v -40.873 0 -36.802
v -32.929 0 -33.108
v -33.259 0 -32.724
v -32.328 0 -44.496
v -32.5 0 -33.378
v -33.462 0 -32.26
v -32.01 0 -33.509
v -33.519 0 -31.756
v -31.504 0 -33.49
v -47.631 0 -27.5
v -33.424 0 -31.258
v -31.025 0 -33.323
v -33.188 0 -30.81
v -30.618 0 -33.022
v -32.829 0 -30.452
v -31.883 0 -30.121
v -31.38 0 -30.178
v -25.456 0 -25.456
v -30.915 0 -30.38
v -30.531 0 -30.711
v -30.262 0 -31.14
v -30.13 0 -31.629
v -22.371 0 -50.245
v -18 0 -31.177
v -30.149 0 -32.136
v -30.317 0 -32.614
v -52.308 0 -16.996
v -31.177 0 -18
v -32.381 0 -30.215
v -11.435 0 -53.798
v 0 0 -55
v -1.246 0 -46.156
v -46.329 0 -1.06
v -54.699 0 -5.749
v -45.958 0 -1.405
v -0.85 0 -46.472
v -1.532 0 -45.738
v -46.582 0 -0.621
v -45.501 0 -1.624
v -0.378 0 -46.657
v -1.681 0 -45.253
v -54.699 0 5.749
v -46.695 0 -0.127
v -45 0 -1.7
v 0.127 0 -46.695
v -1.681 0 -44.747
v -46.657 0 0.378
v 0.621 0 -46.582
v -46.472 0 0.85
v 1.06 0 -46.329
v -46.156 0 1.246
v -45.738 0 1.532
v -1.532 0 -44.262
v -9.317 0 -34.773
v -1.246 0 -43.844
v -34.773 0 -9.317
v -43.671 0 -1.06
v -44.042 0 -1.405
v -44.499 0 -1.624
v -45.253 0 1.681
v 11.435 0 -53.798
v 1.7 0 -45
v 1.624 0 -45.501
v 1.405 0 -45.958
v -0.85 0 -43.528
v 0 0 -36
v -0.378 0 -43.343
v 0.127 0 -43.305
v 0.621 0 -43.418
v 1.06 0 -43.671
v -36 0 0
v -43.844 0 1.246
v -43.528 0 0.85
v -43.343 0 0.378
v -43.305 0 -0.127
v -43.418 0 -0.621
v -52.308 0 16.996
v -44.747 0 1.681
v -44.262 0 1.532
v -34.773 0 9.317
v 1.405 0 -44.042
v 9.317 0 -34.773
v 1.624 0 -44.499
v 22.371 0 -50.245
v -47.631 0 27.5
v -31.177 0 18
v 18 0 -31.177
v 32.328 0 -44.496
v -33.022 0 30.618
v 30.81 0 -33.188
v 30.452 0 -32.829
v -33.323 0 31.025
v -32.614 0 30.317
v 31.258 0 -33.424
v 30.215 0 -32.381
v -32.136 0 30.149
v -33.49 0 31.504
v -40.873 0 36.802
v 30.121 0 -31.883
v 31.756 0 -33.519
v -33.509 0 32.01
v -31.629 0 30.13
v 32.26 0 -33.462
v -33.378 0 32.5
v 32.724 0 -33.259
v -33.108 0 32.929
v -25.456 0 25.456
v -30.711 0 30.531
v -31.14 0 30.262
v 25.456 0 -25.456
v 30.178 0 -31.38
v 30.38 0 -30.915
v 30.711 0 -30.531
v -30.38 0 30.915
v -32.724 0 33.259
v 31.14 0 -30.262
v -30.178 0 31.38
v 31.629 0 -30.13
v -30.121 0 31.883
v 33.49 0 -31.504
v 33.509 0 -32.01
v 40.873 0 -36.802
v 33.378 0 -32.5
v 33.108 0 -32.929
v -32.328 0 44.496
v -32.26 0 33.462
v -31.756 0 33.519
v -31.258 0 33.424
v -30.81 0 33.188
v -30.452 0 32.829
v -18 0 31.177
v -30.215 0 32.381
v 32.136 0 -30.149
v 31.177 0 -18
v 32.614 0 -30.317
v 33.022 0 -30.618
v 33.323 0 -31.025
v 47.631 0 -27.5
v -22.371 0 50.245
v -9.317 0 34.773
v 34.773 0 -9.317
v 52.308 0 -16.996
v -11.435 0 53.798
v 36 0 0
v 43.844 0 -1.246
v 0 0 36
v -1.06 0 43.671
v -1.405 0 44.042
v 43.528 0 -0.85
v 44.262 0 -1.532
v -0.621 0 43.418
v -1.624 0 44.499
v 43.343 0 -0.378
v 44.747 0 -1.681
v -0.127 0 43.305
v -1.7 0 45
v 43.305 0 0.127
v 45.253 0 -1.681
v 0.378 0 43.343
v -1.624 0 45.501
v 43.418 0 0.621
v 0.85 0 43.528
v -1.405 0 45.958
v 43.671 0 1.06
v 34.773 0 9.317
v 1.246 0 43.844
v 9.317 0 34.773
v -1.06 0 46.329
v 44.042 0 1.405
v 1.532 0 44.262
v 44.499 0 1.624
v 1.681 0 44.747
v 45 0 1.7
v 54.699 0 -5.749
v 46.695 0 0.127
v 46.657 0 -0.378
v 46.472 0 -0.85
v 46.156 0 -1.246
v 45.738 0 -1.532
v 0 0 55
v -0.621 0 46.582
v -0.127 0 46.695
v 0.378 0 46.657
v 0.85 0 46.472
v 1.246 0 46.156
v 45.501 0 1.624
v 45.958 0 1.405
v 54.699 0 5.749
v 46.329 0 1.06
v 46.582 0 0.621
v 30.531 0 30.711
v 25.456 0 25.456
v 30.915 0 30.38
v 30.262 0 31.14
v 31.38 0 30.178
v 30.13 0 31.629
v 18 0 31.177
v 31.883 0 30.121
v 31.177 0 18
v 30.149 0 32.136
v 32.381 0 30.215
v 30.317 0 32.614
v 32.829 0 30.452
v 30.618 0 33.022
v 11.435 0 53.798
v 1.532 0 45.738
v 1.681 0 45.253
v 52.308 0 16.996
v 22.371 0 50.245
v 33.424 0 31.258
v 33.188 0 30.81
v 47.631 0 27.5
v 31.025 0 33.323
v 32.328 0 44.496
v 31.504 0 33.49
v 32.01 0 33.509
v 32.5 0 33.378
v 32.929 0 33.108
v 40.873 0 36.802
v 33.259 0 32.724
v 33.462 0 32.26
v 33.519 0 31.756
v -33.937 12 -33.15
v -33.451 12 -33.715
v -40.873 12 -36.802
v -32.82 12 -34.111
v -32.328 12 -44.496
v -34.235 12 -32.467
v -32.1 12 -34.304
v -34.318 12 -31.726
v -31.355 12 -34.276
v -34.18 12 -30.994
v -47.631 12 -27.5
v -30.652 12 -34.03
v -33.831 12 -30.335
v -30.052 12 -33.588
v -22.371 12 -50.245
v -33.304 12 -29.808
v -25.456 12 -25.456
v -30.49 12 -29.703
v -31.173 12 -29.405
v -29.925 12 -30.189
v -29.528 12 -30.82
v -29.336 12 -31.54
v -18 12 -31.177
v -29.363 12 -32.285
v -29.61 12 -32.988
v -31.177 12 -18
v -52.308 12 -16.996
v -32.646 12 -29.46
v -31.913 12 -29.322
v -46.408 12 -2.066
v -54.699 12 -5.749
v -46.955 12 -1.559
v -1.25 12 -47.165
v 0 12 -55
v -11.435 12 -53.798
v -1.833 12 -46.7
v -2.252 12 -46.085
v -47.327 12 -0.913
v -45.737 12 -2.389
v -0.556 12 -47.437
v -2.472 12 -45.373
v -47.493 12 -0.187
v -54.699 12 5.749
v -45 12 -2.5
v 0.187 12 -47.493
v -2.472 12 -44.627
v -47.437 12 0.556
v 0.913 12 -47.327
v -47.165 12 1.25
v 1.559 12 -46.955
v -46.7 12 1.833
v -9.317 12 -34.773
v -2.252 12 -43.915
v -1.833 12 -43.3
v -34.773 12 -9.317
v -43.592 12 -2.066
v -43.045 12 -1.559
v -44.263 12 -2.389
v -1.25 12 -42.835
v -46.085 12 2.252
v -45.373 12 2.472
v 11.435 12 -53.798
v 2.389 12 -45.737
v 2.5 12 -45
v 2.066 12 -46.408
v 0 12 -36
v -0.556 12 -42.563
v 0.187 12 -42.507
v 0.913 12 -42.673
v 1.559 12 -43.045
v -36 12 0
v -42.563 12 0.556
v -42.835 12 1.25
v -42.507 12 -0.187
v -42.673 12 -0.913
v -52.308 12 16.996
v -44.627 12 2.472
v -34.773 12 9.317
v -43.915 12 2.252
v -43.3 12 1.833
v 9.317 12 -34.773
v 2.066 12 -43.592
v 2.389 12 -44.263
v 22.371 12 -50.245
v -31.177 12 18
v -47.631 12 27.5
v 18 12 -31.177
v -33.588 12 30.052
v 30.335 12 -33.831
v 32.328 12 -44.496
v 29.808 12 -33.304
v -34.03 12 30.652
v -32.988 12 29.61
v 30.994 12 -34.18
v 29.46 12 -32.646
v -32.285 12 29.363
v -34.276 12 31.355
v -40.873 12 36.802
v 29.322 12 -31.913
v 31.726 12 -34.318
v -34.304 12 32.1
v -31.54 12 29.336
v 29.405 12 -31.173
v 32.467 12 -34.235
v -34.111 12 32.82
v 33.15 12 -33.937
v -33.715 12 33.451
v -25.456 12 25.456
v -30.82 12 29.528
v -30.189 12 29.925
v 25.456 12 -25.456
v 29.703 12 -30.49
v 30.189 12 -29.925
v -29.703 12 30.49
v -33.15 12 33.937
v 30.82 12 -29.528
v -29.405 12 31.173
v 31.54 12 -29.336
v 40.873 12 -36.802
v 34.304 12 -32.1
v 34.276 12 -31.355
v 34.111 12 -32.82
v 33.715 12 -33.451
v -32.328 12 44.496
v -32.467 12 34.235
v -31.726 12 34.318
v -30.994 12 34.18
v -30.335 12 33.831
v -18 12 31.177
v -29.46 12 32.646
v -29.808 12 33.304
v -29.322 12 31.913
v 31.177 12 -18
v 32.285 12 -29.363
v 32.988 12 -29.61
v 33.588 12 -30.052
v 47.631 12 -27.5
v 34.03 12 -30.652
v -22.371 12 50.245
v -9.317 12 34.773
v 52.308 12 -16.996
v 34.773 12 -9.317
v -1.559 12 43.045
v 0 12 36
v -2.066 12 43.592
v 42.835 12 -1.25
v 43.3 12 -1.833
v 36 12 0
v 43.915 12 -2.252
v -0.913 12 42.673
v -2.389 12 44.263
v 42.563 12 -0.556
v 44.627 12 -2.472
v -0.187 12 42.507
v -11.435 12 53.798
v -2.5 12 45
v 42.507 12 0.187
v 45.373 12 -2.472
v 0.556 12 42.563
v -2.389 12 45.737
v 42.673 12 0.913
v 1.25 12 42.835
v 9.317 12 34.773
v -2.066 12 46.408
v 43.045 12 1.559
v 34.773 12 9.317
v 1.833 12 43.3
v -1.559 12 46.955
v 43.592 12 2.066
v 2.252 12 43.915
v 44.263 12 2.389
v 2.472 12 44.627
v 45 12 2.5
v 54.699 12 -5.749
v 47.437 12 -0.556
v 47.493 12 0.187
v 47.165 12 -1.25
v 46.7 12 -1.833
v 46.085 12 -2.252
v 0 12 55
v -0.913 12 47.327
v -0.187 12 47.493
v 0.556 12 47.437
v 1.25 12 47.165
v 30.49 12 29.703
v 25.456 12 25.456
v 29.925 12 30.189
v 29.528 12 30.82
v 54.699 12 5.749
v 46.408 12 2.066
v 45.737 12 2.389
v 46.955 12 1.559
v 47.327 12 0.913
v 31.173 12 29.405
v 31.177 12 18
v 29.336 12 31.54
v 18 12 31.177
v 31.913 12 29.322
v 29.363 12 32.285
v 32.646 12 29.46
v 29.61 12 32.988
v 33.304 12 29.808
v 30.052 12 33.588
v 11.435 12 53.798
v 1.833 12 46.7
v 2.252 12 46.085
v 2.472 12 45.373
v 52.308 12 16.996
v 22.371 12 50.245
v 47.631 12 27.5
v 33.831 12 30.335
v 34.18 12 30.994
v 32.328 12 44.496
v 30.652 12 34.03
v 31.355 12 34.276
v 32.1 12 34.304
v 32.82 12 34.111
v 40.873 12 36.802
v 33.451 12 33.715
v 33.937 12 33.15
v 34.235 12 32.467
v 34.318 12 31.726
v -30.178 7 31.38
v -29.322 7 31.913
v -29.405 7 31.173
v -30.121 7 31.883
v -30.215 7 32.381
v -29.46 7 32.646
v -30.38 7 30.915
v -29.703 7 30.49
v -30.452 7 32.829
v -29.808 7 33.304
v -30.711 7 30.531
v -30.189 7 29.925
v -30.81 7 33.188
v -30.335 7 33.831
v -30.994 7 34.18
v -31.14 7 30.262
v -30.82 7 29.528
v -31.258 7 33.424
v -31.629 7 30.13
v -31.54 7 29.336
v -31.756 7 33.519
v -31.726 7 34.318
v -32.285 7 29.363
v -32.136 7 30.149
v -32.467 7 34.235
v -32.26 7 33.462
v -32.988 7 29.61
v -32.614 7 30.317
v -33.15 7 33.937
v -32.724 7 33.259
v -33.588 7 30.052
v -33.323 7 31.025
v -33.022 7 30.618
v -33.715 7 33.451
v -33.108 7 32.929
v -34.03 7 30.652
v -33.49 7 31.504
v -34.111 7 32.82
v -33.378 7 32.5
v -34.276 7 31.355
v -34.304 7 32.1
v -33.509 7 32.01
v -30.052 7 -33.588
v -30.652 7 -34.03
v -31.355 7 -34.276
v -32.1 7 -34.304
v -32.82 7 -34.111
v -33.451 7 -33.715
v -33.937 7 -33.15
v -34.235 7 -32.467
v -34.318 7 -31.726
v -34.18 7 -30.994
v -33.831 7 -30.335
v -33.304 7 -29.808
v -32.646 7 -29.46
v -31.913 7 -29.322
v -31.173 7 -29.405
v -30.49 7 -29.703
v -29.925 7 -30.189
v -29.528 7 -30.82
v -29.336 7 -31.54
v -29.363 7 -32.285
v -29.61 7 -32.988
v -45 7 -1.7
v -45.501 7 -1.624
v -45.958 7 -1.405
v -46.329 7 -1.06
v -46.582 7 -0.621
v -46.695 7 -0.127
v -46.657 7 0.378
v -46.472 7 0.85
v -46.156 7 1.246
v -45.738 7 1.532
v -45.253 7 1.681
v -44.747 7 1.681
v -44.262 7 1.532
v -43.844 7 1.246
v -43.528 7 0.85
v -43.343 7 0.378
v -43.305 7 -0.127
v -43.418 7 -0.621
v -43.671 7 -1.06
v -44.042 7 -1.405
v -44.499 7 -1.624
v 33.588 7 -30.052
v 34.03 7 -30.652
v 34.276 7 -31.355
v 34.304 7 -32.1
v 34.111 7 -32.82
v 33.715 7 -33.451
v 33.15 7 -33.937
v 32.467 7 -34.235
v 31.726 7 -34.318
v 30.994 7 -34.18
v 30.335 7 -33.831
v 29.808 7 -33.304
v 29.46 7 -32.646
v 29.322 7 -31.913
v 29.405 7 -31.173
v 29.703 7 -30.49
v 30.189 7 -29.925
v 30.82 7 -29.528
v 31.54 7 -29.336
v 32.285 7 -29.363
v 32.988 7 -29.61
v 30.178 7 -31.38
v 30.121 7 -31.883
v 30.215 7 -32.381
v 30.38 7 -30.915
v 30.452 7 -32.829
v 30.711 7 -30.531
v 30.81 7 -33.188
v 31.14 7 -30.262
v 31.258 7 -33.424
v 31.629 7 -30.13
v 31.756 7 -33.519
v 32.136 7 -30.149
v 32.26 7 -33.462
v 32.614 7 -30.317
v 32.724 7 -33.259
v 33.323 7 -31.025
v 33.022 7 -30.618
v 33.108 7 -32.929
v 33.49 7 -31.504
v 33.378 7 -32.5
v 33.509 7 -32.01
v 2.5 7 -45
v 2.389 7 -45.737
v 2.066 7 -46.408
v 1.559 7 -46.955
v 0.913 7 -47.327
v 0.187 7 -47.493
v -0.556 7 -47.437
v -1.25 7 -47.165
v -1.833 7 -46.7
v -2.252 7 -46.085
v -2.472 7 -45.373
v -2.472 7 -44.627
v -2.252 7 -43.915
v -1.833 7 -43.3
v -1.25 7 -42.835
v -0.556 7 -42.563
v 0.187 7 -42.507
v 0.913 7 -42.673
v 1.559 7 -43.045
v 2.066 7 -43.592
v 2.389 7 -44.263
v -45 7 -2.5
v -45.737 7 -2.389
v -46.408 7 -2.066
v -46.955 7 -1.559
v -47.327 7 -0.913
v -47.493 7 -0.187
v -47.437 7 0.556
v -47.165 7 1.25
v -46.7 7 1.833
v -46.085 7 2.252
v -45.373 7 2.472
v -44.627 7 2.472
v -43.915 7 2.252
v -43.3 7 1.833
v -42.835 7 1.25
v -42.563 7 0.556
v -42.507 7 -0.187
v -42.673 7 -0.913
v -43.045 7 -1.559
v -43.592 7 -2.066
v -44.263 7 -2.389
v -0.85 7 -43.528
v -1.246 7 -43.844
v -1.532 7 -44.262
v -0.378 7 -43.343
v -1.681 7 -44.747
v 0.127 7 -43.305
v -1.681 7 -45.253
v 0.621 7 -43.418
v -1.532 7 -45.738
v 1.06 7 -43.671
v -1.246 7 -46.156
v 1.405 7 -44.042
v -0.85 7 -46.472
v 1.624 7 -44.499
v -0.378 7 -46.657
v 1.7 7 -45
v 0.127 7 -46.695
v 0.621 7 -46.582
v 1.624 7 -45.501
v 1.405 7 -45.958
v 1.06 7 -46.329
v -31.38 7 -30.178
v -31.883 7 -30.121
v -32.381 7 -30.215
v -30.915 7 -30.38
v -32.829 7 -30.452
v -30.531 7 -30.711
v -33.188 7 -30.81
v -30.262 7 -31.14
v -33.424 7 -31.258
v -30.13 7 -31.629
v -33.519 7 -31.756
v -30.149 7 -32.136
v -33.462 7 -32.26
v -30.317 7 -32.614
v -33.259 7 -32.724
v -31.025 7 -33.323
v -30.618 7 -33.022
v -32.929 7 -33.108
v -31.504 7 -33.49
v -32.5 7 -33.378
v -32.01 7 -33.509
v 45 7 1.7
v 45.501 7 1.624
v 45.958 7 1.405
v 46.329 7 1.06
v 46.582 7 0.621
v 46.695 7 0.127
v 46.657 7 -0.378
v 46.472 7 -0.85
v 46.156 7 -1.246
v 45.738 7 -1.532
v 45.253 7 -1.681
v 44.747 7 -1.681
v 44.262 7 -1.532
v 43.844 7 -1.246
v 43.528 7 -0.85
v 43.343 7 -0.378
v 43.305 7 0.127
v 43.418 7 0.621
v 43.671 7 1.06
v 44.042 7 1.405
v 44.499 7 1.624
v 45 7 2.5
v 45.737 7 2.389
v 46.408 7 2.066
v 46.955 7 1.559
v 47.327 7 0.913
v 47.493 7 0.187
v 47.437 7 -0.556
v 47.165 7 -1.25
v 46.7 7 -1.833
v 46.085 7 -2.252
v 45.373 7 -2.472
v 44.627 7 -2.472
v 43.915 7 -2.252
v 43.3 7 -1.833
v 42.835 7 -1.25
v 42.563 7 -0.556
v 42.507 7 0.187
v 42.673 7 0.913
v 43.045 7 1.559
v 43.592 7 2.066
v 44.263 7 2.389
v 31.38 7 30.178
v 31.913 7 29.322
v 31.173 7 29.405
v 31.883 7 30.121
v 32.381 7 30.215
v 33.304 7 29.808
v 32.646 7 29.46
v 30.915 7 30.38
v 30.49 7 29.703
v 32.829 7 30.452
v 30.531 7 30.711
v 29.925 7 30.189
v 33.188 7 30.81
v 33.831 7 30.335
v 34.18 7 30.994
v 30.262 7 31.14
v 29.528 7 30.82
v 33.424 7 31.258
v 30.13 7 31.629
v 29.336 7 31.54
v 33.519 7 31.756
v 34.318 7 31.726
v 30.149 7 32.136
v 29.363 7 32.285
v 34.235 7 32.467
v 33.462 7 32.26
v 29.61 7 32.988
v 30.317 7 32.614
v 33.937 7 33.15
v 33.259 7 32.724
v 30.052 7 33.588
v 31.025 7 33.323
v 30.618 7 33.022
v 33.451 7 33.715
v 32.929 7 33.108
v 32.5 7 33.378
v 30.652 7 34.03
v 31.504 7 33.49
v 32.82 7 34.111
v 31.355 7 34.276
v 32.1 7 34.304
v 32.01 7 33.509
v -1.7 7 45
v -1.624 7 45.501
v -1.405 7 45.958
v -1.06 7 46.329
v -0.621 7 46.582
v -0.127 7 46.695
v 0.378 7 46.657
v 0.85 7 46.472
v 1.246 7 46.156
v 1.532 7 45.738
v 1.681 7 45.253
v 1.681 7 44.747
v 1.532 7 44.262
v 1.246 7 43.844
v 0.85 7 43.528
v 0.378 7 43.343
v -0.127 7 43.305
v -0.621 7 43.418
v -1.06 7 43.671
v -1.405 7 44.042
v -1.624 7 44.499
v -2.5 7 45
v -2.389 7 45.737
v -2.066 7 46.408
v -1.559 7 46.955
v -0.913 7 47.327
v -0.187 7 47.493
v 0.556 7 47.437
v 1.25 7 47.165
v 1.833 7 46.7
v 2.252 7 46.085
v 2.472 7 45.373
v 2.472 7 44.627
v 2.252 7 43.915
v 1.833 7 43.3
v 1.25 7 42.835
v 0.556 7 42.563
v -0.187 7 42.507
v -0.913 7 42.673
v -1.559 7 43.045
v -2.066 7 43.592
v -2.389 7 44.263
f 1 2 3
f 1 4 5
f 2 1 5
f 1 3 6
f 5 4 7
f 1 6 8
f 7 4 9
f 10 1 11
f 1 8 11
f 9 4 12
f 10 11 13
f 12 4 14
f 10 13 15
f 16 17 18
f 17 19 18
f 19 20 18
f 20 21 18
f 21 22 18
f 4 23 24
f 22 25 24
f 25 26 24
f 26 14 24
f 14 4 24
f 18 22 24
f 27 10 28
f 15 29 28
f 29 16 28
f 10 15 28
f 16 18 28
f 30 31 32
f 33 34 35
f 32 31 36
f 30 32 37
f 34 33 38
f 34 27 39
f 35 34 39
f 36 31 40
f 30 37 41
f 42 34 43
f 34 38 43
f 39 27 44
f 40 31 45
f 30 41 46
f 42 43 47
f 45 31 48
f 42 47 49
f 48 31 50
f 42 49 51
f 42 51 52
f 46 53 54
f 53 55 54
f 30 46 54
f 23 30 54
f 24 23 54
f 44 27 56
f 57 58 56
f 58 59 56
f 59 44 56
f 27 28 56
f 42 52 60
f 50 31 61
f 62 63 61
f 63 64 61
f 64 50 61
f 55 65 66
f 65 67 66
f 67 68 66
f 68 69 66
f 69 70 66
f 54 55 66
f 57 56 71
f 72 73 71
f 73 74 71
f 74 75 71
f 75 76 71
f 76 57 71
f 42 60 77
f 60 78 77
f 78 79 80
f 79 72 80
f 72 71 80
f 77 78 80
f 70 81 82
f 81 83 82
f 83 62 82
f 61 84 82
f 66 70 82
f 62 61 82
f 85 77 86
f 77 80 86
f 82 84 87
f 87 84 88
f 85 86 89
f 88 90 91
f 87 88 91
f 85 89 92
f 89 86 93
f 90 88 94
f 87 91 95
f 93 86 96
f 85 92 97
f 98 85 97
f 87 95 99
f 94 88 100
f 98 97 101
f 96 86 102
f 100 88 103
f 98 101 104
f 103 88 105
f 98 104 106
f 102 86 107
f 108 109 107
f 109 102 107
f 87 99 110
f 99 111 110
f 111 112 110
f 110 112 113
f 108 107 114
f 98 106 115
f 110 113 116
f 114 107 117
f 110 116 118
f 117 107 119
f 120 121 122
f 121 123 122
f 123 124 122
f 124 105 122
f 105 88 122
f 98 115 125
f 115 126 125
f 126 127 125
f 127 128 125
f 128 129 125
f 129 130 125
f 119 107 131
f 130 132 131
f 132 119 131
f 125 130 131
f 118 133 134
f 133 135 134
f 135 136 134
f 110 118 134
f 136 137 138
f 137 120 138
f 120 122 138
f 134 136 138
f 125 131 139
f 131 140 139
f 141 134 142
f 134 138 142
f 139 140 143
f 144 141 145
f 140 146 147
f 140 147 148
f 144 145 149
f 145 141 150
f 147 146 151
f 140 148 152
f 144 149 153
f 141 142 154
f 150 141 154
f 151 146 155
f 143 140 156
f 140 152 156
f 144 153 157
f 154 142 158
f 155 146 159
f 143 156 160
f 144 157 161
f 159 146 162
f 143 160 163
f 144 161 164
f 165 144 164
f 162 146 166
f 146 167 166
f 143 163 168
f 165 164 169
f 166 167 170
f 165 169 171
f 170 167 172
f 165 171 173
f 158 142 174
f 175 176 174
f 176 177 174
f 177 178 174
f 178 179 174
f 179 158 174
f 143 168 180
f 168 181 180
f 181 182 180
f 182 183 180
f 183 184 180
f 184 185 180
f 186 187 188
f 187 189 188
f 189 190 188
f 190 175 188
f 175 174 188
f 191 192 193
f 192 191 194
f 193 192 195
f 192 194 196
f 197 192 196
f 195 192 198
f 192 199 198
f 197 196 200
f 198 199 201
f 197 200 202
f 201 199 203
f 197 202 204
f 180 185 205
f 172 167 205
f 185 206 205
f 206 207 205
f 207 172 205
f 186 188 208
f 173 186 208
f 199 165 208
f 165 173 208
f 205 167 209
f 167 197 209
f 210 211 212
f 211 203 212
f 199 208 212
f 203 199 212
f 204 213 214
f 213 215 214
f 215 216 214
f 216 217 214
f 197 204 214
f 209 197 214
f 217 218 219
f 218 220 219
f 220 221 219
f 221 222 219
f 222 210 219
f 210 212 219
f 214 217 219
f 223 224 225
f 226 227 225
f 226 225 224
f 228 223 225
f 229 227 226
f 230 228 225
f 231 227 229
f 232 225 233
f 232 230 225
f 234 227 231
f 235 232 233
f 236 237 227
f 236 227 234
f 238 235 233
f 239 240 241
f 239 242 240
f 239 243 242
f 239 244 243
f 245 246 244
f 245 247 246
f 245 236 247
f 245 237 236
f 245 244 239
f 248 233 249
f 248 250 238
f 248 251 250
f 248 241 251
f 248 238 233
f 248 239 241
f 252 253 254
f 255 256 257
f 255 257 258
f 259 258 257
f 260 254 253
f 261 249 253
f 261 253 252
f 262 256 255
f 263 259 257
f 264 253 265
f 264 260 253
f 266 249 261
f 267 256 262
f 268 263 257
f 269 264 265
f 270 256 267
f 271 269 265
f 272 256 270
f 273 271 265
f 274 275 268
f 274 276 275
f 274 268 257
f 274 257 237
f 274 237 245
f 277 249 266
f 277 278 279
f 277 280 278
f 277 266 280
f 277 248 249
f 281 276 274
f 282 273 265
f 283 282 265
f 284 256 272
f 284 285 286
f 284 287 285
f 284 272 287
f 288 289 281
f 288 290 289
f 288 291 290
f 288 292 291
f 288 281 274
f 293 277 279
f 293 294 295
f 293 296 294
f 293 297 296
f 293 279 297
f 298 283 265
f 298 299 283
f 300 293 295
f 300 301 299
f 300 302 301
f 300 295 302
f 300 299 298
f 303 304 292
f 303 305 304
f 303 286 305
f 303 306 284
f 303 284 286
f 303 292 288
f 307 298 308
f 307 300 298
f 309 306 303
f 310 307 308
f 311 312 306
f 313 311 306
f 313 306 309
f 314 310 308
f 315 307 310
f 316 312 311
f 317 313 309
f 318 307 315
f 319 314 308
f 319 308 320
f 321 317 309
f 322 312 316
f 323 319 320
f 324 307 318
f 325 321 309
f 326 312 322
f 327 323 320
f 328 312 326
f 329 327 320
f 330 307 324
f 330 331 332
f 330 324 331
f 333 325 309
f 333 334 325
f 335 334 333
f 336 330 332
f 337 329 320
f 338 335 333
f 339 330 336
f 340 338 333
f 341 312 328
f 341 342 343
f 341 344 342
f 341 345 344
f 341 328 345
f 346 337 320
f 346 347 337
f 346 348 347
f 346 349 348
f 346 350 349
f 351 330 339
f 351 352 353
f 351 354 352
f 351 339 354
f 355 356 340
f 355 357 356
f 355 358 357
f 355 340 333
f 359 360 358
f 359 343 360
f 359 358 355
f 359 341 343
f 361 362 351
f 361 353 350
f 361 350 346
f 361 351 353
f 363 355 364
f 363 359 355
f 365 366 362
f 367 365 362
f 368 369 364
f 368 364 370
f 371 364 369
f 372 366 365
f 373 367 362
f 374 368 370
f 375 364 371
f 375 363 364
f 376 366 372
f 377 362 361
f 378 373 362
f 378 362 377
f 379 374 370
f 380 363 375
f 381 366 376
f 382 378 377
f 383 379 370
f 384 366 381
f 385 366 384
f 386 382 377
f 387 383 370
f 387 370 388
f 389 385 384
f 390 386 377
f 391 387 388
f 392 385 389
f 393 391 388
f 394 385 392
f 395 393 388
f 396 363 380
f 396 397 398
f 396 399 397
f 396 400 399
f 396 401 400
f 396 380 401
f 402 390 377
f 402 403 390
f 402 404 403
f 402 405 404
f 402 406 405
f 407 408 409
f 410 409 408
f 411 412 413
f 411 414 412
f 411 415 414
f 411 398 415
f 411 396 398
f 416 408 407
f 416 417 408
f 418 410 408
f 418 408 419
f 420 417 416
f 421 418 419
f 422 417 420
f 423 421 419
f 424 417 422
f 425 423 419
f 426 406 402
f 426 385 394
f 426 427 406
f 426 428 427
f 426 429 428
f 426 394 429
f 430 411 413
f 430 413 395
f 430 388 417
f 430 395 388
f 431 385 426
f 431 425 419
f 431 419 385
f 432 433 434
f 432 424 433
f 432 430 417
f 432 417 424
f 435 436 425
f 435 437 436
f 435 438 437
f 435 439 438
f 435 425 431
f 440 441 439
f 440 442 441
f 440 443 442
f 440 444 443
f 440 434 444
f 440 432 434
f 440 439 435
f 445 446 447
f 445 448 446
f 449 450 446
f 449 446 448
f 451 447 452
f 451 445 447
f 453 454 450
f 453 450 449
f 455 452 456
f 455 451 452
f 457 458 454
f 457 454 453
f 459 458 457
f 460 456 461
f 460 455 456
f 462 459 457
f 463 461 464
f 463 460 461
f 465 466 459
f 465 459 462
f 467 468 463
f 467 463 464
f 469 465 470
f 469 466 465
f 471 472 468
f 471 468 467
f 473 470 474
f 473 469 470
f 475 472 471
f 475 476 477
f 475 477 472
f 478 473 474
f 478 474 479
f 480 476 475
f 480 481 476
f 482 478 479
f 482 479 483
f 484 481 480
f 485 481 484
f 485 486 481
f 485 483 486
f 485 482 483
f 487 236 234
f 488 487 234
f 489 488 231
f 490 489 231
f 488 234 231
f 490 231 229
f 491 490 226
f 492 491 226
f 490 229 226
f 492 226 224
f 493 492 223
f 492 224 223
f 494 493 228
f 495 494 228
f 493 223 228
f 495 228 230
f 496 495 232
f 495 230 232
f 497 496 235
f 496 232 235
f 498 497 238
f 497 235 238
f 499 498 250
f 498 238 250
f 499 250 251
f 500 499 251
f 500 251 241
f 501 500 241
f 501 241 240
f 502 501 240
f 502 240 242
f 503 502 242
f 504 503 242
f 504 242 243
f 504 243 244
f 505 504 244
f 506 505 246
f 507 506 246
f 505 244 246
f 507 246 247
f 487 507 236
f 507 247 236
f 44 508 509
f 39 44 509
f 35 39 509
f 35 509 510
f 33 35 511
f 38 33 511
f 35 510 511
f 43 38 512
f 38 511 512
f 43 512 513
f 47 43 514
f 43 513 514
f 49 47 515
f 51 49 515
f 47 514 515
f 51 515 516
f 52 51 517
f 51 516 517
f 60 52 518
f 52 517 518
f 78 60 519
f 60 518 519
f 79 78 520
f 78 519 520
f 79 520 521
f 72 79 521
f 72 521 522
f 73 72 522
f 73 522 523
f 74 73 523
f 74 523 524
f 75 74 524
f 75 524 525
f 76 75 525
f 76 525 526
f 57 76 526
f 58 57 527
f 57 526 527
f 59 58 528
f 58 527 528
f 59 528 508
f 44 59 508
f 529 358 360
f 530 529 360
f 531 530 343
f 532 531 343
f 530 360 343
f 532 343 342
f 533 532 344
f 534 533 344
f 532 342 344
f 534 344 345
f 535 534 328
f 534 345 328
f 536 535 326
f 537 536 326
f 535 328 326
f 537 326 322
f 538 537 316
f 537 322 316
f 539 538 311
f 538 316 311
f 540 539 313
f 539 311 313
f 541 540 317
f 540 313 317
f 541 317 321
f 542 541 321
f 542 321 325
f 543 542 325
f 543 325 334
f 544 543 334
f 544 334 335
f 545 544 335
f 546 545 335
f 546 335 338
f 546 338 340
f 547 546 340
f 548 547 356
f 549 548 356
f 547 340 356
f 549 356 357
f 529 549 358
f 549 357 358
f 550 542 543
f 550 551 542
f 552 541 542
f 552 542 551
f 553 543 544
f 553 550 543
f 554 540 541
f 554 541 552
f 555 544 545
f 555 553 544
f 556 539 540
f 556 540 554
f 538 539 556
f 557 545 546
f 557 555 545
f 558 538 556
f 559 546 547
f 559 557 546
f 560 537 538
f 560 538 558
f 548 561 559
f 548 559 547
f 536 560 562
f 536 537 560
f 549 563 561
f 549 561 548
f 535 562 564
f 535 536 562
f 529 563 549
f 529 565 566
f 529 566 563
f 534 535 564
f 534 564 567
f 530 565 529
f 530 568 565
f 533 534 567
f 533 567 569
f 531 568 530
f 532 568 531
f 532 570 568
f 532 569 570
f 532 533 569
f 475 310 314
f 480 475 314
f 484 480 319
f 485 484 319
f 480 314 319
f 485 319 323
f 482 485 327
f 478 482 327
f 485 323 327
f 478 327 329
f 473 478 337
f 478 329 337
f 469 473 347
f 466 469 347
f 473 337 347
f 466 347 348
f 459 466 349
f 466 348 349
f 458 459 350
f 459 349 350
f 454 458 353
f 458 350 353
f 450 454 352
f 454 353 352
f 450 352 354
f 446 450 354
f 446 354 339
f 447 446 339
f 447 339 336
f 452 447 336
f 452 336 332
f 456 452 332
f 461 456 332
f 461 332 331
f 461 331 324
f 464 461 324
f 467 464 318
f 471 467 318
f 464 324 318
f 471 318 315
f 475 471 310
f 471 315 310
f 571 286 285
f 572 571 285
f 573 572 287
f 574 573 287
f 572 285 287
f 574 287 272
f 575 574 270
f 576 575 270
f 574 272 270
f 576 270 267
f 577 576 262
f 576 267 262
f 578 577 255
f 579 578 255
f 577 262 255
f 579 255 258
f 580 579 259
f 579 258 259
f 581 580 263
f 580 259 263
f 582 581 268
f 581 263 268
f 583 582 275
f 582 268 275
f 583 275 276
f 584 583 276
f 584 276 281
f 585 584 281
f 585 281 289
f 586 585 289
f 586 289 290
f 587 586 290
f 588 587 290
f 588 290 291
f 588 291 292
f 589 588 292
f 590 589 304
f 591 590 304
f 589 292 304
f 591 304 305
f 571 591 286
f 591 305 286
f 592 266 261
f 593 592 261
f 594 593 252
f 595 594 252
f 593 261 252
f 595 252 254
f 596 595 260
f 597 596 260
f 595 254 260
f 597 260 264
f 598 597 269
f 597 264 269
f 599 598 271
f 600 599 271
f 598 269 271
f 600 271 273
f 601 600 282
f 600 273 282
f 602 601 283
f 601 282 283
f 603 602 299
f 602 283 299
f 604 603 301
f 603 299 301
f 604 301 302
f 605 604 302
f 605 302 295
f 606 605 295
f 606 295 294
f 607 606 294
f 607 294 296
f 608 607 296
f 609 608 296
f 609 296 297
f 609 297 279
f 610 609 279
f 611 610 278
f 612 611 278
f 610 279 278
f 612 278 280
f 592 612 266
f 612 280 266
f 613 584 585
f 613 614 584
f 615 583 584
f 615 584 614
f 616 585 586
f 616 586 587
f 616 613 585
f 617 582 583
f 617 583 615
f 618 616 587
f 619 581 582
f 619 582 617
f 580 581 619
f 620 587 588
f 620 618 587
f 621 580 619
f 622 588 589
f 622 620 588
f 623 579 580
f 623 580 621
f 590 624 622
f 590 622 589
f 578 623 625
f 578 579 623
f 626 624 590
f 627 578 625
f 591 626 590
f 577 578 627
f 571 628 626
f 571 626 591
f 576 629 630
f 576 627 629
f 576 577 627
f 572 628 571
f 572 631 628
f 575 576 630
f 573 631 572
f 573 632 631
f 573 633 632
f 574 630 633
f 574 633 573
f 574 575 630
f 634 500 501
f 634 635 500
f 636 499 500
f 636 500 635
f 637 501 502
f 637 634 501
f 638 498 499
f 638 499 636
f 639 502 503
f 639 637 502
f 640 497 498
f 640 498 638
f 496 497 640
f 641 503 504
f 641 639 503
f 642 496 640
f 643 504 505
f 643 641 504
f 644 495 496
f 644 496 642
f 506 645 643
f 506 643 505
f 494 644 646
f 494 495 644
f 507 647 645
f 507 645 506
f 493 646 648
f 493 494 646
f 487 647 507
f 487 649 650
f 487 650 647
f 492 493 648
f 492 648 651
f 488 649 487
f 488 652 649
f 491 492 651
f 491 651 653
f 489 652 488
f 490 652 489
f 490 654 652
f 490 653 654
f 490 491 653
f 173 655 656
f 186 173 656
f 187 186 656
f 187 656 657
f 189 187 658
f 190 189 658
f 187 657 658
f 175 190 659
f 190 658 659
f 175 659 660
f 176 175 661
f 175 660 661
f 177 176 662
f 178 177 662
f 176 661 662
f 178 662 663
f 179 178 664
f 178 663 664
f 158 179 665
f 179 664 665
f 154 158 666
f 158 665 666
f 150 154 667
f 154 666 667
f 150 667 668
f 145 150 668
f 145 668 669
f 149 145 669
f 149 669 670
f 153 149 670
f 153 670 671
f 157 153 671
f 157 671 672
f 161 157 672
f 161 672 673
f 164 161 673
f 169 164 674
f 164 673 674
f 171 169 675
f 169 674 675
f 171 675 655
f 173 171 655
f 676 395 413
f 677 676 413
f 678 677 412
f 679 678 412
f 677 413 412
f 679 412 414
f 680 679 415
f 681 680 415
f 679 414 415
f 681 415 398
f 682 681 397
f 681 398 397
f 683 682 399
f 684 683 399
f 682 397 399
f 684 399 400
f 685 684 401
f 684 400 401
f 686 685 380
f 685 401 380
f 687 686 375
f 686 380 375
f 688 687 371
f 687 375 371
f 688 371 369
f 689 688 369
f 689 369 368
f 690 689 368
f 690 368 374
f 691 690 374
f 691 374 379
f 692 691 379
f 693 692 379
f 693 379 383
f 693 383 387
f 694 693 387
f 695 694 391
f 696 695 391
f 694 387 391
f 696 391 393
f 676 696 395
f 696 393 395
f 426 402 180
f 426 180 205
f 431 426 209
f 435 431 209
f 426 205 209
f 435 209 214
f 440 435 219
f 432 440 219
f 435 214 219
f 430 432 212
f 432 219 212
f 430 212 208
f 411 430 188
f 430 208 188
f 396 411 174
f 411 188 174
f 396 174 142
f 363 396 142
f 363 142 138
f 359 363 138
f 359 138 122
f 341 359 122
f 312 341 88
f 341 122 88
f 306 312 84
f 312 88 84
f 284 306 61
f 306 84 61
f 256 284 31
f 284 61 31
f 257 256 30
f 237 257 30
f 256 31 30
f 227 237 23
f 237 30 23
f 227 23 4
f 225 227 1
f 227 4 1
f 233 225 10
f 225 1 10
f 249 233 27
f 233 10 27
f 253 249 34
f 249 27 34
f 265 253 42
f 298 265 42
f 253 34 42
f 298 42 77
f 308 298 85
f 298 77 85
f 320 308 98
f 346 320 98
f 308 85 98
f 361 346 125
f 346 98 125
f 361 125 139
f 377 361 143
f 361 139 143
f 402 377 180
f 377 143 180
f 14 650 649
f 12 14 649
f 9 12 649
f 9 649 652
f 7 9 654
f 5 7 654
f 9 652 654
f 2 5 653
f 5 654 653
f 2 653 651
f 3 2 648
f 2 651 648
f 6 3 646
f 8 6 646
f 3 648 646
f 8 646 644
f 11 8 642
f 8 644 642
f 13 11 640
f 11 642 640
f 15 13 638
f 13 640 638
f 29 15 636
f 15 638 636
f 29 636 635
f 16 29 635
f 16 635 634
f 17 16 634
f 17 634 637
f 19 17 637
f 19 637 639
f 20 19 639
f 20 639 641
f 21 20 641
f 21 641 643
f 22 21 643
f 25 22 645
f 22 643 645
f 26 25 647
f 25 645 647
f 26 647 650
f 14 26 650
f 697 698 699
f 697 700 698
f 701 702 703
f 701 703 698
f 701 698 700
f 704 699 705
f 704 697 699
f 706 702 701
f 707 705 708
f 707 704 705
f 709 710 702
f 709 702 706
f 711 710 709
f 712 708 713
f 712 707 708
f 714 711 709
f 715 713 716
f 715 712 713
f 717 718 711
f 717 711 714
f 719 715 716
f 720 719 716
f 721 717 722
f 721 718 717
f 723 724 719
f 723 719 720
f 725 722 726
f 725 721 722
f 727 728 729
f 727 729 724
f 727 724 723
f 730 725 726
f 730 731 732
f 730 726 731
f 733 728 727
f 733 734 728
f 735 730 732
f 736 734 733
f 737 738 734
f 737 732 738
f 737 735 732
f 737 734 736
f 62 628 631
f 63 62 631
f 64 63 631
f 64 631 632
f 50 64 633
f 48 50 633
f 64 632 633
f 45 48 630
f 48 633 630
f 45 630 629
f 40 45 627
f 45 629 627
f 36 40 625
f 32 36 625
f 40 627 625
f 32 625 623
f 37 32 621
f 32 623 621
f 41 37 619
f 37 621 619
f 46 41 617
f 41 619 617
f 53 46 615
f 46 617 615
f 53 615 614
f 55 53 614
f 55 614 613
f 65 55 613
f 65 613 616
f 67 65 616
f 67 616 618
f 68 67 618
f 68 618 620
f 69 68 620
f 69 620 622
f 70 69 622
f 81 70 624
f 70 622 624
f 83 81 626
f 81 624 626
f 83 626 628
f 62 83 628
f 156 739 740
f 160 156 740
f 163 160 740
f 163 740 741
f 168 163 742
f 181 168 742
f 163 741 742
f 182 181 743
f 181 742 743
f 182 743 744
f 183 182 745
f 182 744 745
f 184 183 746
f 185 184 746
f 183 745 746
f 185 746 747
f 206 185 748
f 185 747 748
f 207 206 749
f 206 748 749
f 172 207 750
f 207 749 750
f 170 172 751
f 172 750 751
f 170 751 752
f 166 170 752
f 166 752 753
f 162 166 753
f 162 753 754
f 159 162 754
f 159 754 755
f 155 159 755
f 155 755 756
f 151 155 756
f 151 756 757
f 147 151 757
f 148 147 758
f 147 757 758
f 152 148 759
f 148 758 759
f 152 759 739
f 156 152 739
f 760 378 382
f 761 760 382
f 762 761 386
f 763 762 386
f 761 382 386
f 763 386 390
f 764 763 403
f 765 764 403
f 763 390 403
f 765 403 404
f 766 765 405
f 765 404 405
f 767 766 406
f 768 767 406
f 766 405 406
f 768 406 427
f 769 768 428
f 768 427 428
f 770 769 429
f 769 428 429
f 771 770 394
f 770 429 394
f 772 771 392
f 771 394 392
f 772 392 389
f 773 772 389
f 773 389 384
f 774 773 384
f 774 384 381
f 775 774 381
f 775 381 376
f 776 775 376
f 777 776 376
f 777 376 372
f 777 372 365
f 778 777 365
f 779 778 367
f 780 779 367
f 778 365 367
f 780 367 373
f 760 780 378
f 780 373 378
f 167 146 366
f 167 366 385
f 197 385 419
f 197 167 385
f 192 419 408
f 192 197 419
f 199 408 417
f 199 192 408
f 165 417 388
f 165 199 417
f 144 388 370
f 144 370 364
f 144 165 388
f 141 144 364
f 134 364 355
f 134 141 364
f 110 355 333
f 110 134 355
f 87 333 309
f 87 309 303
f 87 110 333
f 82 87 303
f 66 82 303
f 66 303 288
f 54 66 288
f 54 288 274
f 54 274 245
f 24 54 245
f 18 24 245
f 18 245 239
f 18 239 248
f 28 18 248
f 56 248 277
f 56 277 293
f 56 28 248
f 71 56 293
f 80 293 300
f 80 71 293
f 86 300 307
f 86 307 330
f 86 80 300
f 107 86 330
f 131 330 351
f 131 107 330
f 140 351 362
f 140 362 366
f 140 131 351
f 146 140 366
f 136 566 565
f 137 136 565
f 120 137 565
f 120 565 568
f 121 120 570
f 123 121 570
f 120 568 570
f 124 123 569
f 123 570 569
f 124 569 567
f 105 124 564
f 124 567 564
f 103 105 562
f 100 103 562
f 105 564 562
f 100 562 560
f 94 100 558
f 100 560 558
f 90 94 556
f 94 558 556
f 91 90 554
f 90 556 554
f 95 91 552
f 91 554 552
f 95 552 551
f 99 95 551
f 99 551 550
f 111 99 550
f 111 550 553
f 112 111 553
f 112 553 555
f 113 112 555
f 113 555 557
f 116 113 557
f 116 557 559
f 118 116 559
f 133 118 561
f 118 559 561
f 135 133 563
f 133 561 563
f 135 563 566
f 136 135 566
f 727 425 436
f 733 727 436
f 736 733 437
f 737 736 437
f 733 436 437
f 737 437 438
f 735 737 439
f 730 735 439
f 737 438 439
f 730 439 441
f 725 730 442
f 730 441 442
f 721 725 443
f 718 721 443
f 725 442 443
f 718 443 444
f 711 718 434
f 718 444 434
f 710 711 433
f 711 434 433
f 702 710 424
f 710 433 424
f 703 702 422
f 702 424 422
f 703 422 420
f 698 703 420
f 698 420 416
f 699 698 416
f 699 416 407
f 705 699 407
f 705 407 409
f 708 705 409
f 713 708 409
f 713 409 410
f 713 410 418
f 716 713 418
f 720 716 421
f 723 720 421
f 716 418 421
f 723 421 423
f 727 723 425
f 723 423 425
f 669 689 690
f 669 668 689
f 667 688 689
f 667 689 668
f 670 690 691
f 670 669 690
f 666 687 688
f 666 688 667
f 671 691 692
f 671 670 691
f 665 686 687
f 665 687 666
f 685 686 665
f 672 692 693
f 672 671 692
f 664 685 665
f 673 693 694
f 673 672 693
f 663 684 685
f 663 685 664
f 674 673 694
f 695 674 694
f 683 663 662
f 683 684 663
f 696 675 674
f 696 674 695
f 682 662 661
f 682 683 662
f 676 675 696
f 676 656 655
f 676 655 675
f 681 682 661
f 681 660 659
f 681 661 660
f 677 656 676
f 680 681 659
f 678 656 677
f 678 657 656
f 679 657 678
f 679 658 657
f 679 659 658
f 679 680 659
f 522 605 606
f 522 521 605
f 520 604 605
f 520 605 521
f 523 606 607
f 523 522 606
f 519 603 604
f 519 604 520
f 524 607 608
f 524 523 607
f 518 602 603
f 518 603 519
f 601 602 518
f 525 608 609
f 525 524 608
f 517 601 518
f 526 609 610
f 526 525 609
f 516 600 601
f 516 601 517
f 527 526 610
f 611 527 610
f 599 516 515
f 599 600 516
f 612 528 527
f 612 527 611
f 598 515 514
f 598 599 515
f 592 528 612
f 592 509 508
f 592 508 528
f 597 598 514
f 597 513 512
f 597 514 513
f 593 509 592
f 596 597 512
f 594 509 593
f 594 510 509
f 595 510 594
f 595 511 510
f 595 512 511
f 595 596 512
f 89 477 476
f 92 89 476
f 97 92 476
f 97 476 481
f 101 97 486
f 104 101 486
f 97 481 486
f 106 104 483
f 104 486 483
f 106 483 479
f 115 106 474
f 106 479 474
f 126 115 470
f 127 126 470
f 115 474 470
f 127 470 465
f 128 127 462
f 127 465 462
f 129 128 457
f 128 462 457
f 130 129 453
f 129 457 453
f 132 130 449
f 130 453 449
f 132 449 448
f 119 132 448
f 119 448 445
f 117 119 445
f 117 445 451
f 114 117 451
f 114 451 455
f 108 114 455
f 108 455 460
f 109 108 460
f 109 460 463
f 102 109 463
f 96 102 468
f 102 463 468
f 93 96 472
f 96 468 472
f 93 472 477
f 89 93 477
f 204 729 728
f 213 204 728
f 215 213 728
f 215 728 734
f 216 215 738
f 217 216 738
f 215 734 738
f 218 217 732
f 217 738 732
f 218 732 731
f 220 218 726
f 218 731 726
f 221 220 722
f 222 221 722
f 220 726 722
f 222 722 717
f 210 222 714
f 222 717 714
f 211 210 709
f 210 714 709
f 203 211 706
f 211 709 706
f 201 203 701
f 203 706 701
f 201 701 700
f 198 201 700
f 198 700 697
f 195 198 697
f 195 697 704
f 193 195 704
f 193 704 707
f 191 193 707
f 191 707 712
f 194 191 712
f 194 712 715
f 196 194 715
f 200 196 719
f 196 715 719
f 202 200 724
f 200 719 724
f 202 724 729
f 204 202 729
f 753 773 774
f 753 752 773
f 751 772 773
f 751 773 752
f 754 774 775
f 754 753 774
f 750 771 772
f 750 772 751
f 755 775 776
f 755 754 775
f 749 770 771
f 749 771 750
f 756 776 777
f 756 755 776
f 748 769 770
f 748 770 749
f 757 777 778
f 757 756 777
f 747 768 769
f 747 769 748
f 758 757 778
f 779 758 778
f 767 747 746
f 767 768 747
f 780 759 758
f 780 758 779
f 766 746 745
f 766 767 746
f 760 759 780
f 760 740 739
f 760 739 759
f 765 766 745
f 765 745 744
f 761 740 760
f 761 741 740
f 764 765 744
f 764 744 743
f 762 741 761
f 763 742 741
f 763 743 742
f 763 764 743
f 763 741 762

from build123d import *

# Parameters (mm, degrees)
SKETCH1_R           = 55
SKETCH1_R_2         = 36
BOSS_EXTRUDE1_DEPTH = 12
SKETCH2_R           = 1.7
CUT_EXTRUDE1_DEPTH  = 79.70196948
SKETCH3_R           = 2.5
CUT_EXTRUDE2_DEPTH  = 5
CIRPATTERN1_COUNT   = 8


with BuildPart() as part:
    # Sketch1 → Boss-Extrude1 (new body)
    with BuildSketch(Plane(origin=(0, 0, 0), x_dir=(1, 0, 0), z_dir=(0, 1, 0))):
        with Locations(Location((0, 0, 0), (0, 0, 270))):
            Circle(SKETCH1_R)
        with Locations(Location((0, 0, 0), (0, 0, 270))):
            Circle(SKETCH1_R_2, mode=Mode.SUBTRACT)
    extrude(amount=BOSS_EXTRUDE1_DEPTH)

    # Sketch2 → Cut-Extrude1 (cut, symmetric)
    with BuildSketch(Plane(origin=(0, 12, 0), x_dir=(1, 0, 0), z_dir=(0, 1, 0))):
        with Locations(Location((45, 0, 0), (0, 0, 270))):
            Circle(SKETCH2_R)
    cut_extrude1 = extrude(amount=CUT_EXTRUDE1_DEPTH, both=True, mode=Mode.SUBTRACT)

    # Sketch3 → Cut-Extrude2 (cut)
    with BuildSketch(Plane(origin=(0, 12, 0), x_dir=(1, 0, 0), z_dir=(0, 1, 0))):
        with Locations(Location((45, 0, 0), (0, 0, 270))):
            Circle(SKETCH3_R)
    cut_extrude2 = extrude(amount=-CUT_EXTRUDE2_DEPTH, mode=Mode.SUBTRACT)

    # CirPattern1: Cut-Extrude1, Cut-Extrude2 ×8 about axis
    cirpattern1_axis = Axis((0, 0, 0), (0, 1, 0))
    add([cut_extrude1.rotate(cirpattern1_axis, i * 360 / CIRPATTERN1_COUNT) for i in range(1, CIRPATTERN1_COUNT)], mode=Mode.SUBTRACT)
    add([cut_extrude2.rotate(cirpattern1_axis, i * 360 / CIRPATTERN1_COUNT) for i in range(1, CIRPATTERN1_COUNT)], mode=Mode.SUBTRACT)


solid = part.part
